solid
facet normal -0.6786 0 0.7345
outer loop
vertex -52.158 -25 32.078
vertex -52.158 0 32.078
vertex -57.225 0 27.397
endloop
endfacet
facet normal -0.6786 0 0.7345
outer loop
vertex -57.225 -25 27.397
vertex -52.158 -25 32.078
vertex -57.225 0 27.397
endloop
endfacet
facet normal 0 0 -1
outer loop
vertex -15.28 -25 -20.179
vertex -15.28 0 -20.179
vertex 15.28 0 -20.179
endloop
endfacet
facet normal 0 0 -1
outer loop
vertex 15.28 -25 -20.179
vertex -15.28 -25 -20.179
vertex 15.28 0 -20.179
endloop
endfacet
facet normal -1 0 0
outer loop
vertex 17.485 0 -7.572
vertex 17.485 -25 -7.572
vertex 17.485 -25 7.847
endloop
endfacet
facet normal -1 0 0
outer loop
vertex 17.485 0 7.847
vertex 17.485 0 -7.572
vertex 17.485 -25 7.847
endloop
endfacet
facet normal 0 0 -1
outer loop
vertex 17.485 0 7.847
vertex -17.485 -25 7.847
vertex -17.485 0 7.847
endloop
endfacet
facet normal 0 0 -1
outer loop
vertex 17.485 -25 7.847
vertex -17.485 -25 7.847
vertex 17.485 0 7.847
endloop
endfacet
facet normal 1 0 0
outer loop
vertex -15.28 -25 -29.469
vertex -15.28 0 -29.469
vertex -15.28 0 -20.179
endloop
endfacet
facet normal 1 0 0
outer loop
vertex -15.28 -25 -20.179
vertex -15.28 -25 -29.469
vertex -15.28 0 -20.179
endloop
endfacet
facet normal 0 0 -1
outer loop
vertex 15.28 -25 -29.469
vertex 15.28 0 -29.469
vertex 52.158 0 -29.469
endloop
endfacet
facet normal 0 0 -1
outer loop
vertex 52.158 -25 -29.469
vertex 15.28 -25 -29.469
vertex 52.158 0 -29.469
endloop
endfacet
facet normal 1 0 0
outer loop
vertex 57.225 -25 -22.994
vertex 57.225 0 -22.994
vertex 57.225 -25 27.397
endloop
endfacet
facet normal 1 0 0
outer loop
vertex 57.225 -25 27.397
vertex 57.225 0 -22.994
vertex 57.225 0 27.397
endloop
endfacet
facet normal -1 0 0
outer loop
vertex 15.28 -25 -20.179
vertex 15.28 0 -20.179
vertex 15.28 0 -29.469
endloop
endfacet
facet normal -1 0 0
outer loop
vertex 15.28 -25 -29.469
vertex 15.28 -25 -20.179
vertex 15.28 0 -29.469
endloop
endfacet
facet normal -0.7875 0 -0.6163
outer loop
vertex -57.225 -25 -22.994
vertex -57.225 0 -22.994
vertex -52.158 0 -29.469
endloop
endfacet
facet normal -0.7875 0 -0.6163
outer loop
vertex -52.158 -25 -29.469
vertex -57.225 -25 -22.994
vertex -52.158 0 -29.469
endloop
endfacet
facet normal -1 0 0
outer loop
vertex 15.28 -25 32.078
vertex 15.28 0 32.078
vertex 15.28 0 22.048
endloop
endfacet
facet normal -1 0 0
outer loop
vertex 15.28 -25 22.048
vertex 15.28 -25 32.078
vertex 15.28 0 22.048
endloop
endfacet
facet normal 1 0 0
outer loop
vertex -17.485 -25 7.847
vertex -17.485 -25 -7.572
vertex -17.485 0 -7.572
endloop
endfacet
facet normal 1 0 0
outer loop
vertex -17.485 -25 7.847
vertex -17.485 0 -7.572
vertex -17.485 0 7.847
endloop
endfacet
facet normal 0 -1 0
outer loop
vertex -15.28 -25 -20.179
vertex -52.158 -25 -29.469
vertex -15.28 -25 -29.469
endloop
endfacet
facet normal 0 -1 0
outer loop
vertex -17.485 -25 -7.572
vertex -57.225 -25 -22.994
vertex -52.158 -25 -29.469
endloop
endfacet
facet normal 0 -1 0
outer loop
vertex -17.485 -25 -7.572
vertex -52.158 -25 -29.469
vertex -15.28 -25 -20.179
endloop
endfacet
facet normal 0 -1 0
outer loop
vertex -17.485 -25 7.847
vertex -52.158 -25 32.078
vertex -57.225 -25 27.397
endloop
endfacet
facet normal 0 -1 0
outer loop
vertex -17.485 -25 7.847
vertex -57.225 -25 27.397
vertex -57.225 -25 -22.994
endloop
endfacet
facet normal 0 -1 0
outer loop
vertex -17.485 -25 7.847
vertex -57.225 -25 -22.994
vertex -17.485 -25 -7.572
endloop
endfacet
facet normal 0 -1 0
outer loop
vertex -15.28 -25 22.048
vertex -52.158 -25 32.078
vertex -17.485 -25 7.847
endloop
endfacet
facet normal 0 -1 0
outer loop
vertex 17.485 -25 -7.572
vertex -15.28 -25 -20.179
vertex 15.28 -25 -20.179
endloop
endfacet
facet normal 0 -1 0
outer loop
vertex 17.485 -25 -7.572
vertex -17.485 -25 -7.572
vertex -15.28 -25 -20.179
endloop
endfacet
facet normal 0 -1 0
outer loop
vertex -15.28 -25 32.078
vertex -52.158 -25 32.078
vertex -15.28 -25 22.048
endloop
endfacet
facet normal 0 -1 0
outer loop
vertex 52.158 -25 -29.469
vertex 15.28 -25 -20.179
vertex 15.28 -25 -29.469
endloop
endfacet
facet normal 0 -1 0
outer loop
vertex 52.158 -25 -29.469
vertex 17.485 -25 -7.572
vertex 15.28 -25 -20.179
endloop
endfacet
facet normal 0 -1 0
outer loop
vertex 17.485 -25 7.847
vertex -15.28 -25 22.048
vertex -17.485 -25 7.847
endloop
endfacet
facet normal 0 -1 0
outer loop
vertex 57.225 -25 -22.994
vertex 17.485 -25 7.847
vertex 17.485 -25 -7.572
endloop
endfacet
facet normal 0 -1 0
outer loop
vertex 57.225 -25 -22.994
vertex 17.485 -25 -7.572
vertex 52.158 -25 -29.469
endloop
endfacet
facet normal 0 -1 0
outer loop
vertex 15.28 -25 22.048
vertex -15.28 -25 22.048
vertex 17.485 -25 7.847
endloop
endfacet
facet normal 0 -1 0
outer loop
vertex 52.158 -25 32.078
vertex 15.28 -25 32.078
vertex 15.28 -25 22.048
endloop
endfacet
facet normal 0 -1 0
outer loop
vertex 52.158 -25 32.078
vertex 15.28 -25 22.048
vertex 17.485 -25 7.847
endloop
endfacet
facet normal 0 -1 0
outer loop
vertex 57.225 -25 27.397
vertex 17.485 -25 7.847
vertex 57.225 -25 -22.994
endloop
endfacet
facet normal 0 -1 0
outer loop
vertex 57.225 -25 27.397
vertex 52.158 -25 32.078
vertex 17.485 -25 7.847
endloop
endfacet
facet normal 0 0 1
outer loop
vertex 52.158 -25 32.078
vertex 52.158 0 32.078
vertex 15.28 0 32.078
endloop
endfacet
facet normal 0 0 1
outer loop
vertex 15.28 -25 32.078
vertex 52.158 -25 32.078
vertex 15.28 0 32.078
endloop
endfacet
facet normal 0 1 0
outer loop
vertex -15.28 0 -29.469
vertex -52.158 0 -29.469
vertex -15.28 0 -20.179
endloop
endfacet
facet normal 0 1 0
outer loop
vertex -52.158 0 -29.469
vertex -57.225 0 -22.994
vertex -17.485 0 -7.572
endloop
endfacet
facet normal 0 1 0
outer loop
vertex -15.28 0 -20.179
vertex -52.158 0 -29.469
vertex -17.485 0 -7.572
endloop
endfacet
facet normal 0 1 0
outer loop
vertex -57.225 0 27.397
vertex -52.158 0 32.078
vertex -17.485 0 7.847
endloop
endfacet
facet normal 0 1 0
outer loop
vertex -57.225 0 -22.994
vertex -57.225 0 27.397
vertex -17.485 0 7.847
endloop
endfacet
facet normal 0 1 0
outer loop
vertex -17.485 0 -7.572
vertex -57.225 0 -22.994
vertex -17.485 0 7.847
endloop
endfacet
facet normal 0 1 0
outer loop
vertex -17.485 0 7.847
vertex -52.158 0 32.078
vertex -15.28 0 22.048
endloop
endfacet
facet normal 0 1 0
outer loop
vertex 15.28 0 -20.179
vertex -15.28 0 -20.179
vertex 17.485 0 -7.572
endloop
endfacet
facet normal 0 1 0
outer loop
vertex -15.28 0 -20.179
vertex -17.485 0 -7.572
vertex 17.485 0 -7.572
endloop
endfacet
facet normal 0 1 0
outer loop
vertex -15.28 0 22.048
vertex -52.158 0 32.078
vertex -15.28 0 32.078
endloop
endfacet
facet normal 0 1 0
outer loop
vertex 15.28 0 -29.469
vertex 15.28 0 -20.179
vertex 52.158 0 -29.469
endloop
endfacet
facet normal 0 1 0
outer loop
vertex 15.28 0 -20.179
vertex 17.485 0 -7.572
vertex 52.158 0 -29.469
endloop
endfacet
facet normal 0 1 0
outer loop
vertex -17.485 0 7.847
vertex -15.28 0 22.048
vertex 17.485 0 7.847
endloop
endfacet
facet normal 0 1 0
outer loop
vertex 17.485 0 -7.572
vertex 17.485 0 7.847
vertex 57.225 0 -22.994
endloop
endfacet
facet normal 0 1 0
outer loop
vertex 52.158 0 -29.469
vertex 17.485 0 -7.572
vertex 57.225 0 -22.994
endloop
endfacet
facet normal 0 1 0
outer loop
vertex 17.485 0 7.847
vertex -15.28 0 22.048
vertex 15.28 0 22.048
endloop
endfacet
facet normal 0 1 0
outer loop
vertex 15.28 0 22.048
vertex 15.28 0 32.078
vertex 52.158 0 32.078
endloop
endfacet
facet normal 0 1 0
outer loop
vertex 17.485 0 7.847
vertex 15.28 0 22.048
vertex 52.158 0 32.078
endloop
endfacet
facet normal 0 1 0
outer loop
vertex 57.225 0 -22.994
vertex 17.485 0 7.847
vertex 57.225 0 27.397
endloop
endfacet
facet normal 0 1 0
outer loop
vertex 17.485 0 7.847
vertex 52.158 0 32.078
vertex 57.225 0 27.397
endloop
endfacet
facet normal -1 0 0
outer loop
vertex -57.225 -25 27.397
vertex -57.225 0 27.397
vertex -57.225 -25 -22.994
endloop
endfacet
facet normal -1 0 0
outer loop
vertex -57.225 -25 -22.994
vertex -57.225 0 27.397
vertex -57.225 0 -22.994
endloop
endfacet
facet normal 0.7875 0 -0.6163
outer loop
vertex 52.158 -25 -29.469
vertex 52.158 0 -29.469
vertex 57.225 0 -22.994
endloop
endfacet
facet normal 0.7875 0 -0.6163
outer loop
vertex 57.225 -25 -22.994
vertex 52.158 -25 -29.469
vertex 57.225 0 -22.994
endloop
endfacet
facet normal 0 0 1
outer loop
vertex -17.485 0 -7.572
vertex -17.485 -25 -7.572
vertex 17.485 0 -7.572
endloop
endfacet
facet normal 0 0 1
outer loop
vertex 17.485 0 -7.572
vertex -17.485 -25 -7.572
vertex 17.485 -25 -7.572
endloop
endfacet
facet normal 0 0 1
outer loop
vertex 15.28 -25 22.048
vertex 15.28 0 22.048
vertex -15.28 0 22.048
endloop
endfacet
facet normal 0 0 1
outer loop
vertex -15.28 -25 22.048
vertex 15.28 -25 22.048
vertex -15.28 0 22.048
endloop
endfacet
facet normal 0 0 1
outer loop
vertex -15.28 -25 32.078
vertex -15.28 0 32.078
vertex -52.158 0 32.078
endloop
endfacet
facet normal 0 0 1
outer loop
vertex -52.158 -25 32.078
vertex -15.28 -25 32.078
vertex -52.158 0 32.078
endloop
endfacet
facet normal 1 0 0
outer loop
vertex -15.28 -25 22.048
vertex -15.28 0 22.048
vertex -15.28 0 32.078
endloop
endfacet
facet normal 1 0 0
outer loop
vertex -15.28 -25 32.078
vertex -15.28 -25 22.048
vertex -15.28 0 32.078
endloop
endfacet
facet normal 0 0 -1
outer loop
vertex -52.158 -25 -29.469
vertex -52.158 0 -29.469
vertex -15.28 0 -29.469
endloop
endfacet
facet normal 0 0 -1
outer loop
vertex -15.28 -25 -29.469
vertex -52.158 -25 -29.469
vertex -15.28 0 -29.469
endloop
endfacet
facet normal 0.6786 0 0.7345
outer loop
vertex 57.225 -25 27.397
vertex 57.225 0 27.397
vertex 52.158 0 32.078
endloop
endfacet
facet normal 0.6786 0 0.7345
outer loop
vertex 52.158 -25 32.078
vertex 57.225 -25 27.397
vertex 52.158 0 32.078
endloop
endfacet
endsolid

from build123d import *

# Parameters (mm, degrees)
F1_DEPTH = 25
F2_W     = 34.969408
F2_H     = 15.419583
F3_DEPTH = 25


with BuildPart() as f1:
    # F0 (on Front) → F1 (new body)
    with BuildSketch(Plane.XZ):
        Polygon((15.279747, 22.047983), (0, 22.047983), (-15.279747, 22.047983), (-15.279747, 32.078233), (-52.158151, 32.078233), (-57.22541, 27.396761), (-57.22541, 12.758005), (-57.22541, -22.994338), (-52.158151, -29.46917), (-15.279747, -29.46917), (-15.279747, -20.179192), (0, -20.179192), (15.279747, -20.179192), (15.279747, -29.46917), (52.158151, -29.46917), (57.22541, -22.994338), (57.22541, 12.758005), (57.22541, 27.396761), (52.158151, 32.078233), (15.279747, 32.078233), align=None)
    extrude(amount=F1_DEPTH)

    # F2 (on face) → F3 (cut)
    with BuildSketch(Plane.XZ.offset(25)):
        with Locations((0, 0.137676)):
            Rectangle(F2_W, F2_H)
    extrude(amount=-F3_DEPTH, mode=Mode.SUBTRACT)


solid = f1.part
